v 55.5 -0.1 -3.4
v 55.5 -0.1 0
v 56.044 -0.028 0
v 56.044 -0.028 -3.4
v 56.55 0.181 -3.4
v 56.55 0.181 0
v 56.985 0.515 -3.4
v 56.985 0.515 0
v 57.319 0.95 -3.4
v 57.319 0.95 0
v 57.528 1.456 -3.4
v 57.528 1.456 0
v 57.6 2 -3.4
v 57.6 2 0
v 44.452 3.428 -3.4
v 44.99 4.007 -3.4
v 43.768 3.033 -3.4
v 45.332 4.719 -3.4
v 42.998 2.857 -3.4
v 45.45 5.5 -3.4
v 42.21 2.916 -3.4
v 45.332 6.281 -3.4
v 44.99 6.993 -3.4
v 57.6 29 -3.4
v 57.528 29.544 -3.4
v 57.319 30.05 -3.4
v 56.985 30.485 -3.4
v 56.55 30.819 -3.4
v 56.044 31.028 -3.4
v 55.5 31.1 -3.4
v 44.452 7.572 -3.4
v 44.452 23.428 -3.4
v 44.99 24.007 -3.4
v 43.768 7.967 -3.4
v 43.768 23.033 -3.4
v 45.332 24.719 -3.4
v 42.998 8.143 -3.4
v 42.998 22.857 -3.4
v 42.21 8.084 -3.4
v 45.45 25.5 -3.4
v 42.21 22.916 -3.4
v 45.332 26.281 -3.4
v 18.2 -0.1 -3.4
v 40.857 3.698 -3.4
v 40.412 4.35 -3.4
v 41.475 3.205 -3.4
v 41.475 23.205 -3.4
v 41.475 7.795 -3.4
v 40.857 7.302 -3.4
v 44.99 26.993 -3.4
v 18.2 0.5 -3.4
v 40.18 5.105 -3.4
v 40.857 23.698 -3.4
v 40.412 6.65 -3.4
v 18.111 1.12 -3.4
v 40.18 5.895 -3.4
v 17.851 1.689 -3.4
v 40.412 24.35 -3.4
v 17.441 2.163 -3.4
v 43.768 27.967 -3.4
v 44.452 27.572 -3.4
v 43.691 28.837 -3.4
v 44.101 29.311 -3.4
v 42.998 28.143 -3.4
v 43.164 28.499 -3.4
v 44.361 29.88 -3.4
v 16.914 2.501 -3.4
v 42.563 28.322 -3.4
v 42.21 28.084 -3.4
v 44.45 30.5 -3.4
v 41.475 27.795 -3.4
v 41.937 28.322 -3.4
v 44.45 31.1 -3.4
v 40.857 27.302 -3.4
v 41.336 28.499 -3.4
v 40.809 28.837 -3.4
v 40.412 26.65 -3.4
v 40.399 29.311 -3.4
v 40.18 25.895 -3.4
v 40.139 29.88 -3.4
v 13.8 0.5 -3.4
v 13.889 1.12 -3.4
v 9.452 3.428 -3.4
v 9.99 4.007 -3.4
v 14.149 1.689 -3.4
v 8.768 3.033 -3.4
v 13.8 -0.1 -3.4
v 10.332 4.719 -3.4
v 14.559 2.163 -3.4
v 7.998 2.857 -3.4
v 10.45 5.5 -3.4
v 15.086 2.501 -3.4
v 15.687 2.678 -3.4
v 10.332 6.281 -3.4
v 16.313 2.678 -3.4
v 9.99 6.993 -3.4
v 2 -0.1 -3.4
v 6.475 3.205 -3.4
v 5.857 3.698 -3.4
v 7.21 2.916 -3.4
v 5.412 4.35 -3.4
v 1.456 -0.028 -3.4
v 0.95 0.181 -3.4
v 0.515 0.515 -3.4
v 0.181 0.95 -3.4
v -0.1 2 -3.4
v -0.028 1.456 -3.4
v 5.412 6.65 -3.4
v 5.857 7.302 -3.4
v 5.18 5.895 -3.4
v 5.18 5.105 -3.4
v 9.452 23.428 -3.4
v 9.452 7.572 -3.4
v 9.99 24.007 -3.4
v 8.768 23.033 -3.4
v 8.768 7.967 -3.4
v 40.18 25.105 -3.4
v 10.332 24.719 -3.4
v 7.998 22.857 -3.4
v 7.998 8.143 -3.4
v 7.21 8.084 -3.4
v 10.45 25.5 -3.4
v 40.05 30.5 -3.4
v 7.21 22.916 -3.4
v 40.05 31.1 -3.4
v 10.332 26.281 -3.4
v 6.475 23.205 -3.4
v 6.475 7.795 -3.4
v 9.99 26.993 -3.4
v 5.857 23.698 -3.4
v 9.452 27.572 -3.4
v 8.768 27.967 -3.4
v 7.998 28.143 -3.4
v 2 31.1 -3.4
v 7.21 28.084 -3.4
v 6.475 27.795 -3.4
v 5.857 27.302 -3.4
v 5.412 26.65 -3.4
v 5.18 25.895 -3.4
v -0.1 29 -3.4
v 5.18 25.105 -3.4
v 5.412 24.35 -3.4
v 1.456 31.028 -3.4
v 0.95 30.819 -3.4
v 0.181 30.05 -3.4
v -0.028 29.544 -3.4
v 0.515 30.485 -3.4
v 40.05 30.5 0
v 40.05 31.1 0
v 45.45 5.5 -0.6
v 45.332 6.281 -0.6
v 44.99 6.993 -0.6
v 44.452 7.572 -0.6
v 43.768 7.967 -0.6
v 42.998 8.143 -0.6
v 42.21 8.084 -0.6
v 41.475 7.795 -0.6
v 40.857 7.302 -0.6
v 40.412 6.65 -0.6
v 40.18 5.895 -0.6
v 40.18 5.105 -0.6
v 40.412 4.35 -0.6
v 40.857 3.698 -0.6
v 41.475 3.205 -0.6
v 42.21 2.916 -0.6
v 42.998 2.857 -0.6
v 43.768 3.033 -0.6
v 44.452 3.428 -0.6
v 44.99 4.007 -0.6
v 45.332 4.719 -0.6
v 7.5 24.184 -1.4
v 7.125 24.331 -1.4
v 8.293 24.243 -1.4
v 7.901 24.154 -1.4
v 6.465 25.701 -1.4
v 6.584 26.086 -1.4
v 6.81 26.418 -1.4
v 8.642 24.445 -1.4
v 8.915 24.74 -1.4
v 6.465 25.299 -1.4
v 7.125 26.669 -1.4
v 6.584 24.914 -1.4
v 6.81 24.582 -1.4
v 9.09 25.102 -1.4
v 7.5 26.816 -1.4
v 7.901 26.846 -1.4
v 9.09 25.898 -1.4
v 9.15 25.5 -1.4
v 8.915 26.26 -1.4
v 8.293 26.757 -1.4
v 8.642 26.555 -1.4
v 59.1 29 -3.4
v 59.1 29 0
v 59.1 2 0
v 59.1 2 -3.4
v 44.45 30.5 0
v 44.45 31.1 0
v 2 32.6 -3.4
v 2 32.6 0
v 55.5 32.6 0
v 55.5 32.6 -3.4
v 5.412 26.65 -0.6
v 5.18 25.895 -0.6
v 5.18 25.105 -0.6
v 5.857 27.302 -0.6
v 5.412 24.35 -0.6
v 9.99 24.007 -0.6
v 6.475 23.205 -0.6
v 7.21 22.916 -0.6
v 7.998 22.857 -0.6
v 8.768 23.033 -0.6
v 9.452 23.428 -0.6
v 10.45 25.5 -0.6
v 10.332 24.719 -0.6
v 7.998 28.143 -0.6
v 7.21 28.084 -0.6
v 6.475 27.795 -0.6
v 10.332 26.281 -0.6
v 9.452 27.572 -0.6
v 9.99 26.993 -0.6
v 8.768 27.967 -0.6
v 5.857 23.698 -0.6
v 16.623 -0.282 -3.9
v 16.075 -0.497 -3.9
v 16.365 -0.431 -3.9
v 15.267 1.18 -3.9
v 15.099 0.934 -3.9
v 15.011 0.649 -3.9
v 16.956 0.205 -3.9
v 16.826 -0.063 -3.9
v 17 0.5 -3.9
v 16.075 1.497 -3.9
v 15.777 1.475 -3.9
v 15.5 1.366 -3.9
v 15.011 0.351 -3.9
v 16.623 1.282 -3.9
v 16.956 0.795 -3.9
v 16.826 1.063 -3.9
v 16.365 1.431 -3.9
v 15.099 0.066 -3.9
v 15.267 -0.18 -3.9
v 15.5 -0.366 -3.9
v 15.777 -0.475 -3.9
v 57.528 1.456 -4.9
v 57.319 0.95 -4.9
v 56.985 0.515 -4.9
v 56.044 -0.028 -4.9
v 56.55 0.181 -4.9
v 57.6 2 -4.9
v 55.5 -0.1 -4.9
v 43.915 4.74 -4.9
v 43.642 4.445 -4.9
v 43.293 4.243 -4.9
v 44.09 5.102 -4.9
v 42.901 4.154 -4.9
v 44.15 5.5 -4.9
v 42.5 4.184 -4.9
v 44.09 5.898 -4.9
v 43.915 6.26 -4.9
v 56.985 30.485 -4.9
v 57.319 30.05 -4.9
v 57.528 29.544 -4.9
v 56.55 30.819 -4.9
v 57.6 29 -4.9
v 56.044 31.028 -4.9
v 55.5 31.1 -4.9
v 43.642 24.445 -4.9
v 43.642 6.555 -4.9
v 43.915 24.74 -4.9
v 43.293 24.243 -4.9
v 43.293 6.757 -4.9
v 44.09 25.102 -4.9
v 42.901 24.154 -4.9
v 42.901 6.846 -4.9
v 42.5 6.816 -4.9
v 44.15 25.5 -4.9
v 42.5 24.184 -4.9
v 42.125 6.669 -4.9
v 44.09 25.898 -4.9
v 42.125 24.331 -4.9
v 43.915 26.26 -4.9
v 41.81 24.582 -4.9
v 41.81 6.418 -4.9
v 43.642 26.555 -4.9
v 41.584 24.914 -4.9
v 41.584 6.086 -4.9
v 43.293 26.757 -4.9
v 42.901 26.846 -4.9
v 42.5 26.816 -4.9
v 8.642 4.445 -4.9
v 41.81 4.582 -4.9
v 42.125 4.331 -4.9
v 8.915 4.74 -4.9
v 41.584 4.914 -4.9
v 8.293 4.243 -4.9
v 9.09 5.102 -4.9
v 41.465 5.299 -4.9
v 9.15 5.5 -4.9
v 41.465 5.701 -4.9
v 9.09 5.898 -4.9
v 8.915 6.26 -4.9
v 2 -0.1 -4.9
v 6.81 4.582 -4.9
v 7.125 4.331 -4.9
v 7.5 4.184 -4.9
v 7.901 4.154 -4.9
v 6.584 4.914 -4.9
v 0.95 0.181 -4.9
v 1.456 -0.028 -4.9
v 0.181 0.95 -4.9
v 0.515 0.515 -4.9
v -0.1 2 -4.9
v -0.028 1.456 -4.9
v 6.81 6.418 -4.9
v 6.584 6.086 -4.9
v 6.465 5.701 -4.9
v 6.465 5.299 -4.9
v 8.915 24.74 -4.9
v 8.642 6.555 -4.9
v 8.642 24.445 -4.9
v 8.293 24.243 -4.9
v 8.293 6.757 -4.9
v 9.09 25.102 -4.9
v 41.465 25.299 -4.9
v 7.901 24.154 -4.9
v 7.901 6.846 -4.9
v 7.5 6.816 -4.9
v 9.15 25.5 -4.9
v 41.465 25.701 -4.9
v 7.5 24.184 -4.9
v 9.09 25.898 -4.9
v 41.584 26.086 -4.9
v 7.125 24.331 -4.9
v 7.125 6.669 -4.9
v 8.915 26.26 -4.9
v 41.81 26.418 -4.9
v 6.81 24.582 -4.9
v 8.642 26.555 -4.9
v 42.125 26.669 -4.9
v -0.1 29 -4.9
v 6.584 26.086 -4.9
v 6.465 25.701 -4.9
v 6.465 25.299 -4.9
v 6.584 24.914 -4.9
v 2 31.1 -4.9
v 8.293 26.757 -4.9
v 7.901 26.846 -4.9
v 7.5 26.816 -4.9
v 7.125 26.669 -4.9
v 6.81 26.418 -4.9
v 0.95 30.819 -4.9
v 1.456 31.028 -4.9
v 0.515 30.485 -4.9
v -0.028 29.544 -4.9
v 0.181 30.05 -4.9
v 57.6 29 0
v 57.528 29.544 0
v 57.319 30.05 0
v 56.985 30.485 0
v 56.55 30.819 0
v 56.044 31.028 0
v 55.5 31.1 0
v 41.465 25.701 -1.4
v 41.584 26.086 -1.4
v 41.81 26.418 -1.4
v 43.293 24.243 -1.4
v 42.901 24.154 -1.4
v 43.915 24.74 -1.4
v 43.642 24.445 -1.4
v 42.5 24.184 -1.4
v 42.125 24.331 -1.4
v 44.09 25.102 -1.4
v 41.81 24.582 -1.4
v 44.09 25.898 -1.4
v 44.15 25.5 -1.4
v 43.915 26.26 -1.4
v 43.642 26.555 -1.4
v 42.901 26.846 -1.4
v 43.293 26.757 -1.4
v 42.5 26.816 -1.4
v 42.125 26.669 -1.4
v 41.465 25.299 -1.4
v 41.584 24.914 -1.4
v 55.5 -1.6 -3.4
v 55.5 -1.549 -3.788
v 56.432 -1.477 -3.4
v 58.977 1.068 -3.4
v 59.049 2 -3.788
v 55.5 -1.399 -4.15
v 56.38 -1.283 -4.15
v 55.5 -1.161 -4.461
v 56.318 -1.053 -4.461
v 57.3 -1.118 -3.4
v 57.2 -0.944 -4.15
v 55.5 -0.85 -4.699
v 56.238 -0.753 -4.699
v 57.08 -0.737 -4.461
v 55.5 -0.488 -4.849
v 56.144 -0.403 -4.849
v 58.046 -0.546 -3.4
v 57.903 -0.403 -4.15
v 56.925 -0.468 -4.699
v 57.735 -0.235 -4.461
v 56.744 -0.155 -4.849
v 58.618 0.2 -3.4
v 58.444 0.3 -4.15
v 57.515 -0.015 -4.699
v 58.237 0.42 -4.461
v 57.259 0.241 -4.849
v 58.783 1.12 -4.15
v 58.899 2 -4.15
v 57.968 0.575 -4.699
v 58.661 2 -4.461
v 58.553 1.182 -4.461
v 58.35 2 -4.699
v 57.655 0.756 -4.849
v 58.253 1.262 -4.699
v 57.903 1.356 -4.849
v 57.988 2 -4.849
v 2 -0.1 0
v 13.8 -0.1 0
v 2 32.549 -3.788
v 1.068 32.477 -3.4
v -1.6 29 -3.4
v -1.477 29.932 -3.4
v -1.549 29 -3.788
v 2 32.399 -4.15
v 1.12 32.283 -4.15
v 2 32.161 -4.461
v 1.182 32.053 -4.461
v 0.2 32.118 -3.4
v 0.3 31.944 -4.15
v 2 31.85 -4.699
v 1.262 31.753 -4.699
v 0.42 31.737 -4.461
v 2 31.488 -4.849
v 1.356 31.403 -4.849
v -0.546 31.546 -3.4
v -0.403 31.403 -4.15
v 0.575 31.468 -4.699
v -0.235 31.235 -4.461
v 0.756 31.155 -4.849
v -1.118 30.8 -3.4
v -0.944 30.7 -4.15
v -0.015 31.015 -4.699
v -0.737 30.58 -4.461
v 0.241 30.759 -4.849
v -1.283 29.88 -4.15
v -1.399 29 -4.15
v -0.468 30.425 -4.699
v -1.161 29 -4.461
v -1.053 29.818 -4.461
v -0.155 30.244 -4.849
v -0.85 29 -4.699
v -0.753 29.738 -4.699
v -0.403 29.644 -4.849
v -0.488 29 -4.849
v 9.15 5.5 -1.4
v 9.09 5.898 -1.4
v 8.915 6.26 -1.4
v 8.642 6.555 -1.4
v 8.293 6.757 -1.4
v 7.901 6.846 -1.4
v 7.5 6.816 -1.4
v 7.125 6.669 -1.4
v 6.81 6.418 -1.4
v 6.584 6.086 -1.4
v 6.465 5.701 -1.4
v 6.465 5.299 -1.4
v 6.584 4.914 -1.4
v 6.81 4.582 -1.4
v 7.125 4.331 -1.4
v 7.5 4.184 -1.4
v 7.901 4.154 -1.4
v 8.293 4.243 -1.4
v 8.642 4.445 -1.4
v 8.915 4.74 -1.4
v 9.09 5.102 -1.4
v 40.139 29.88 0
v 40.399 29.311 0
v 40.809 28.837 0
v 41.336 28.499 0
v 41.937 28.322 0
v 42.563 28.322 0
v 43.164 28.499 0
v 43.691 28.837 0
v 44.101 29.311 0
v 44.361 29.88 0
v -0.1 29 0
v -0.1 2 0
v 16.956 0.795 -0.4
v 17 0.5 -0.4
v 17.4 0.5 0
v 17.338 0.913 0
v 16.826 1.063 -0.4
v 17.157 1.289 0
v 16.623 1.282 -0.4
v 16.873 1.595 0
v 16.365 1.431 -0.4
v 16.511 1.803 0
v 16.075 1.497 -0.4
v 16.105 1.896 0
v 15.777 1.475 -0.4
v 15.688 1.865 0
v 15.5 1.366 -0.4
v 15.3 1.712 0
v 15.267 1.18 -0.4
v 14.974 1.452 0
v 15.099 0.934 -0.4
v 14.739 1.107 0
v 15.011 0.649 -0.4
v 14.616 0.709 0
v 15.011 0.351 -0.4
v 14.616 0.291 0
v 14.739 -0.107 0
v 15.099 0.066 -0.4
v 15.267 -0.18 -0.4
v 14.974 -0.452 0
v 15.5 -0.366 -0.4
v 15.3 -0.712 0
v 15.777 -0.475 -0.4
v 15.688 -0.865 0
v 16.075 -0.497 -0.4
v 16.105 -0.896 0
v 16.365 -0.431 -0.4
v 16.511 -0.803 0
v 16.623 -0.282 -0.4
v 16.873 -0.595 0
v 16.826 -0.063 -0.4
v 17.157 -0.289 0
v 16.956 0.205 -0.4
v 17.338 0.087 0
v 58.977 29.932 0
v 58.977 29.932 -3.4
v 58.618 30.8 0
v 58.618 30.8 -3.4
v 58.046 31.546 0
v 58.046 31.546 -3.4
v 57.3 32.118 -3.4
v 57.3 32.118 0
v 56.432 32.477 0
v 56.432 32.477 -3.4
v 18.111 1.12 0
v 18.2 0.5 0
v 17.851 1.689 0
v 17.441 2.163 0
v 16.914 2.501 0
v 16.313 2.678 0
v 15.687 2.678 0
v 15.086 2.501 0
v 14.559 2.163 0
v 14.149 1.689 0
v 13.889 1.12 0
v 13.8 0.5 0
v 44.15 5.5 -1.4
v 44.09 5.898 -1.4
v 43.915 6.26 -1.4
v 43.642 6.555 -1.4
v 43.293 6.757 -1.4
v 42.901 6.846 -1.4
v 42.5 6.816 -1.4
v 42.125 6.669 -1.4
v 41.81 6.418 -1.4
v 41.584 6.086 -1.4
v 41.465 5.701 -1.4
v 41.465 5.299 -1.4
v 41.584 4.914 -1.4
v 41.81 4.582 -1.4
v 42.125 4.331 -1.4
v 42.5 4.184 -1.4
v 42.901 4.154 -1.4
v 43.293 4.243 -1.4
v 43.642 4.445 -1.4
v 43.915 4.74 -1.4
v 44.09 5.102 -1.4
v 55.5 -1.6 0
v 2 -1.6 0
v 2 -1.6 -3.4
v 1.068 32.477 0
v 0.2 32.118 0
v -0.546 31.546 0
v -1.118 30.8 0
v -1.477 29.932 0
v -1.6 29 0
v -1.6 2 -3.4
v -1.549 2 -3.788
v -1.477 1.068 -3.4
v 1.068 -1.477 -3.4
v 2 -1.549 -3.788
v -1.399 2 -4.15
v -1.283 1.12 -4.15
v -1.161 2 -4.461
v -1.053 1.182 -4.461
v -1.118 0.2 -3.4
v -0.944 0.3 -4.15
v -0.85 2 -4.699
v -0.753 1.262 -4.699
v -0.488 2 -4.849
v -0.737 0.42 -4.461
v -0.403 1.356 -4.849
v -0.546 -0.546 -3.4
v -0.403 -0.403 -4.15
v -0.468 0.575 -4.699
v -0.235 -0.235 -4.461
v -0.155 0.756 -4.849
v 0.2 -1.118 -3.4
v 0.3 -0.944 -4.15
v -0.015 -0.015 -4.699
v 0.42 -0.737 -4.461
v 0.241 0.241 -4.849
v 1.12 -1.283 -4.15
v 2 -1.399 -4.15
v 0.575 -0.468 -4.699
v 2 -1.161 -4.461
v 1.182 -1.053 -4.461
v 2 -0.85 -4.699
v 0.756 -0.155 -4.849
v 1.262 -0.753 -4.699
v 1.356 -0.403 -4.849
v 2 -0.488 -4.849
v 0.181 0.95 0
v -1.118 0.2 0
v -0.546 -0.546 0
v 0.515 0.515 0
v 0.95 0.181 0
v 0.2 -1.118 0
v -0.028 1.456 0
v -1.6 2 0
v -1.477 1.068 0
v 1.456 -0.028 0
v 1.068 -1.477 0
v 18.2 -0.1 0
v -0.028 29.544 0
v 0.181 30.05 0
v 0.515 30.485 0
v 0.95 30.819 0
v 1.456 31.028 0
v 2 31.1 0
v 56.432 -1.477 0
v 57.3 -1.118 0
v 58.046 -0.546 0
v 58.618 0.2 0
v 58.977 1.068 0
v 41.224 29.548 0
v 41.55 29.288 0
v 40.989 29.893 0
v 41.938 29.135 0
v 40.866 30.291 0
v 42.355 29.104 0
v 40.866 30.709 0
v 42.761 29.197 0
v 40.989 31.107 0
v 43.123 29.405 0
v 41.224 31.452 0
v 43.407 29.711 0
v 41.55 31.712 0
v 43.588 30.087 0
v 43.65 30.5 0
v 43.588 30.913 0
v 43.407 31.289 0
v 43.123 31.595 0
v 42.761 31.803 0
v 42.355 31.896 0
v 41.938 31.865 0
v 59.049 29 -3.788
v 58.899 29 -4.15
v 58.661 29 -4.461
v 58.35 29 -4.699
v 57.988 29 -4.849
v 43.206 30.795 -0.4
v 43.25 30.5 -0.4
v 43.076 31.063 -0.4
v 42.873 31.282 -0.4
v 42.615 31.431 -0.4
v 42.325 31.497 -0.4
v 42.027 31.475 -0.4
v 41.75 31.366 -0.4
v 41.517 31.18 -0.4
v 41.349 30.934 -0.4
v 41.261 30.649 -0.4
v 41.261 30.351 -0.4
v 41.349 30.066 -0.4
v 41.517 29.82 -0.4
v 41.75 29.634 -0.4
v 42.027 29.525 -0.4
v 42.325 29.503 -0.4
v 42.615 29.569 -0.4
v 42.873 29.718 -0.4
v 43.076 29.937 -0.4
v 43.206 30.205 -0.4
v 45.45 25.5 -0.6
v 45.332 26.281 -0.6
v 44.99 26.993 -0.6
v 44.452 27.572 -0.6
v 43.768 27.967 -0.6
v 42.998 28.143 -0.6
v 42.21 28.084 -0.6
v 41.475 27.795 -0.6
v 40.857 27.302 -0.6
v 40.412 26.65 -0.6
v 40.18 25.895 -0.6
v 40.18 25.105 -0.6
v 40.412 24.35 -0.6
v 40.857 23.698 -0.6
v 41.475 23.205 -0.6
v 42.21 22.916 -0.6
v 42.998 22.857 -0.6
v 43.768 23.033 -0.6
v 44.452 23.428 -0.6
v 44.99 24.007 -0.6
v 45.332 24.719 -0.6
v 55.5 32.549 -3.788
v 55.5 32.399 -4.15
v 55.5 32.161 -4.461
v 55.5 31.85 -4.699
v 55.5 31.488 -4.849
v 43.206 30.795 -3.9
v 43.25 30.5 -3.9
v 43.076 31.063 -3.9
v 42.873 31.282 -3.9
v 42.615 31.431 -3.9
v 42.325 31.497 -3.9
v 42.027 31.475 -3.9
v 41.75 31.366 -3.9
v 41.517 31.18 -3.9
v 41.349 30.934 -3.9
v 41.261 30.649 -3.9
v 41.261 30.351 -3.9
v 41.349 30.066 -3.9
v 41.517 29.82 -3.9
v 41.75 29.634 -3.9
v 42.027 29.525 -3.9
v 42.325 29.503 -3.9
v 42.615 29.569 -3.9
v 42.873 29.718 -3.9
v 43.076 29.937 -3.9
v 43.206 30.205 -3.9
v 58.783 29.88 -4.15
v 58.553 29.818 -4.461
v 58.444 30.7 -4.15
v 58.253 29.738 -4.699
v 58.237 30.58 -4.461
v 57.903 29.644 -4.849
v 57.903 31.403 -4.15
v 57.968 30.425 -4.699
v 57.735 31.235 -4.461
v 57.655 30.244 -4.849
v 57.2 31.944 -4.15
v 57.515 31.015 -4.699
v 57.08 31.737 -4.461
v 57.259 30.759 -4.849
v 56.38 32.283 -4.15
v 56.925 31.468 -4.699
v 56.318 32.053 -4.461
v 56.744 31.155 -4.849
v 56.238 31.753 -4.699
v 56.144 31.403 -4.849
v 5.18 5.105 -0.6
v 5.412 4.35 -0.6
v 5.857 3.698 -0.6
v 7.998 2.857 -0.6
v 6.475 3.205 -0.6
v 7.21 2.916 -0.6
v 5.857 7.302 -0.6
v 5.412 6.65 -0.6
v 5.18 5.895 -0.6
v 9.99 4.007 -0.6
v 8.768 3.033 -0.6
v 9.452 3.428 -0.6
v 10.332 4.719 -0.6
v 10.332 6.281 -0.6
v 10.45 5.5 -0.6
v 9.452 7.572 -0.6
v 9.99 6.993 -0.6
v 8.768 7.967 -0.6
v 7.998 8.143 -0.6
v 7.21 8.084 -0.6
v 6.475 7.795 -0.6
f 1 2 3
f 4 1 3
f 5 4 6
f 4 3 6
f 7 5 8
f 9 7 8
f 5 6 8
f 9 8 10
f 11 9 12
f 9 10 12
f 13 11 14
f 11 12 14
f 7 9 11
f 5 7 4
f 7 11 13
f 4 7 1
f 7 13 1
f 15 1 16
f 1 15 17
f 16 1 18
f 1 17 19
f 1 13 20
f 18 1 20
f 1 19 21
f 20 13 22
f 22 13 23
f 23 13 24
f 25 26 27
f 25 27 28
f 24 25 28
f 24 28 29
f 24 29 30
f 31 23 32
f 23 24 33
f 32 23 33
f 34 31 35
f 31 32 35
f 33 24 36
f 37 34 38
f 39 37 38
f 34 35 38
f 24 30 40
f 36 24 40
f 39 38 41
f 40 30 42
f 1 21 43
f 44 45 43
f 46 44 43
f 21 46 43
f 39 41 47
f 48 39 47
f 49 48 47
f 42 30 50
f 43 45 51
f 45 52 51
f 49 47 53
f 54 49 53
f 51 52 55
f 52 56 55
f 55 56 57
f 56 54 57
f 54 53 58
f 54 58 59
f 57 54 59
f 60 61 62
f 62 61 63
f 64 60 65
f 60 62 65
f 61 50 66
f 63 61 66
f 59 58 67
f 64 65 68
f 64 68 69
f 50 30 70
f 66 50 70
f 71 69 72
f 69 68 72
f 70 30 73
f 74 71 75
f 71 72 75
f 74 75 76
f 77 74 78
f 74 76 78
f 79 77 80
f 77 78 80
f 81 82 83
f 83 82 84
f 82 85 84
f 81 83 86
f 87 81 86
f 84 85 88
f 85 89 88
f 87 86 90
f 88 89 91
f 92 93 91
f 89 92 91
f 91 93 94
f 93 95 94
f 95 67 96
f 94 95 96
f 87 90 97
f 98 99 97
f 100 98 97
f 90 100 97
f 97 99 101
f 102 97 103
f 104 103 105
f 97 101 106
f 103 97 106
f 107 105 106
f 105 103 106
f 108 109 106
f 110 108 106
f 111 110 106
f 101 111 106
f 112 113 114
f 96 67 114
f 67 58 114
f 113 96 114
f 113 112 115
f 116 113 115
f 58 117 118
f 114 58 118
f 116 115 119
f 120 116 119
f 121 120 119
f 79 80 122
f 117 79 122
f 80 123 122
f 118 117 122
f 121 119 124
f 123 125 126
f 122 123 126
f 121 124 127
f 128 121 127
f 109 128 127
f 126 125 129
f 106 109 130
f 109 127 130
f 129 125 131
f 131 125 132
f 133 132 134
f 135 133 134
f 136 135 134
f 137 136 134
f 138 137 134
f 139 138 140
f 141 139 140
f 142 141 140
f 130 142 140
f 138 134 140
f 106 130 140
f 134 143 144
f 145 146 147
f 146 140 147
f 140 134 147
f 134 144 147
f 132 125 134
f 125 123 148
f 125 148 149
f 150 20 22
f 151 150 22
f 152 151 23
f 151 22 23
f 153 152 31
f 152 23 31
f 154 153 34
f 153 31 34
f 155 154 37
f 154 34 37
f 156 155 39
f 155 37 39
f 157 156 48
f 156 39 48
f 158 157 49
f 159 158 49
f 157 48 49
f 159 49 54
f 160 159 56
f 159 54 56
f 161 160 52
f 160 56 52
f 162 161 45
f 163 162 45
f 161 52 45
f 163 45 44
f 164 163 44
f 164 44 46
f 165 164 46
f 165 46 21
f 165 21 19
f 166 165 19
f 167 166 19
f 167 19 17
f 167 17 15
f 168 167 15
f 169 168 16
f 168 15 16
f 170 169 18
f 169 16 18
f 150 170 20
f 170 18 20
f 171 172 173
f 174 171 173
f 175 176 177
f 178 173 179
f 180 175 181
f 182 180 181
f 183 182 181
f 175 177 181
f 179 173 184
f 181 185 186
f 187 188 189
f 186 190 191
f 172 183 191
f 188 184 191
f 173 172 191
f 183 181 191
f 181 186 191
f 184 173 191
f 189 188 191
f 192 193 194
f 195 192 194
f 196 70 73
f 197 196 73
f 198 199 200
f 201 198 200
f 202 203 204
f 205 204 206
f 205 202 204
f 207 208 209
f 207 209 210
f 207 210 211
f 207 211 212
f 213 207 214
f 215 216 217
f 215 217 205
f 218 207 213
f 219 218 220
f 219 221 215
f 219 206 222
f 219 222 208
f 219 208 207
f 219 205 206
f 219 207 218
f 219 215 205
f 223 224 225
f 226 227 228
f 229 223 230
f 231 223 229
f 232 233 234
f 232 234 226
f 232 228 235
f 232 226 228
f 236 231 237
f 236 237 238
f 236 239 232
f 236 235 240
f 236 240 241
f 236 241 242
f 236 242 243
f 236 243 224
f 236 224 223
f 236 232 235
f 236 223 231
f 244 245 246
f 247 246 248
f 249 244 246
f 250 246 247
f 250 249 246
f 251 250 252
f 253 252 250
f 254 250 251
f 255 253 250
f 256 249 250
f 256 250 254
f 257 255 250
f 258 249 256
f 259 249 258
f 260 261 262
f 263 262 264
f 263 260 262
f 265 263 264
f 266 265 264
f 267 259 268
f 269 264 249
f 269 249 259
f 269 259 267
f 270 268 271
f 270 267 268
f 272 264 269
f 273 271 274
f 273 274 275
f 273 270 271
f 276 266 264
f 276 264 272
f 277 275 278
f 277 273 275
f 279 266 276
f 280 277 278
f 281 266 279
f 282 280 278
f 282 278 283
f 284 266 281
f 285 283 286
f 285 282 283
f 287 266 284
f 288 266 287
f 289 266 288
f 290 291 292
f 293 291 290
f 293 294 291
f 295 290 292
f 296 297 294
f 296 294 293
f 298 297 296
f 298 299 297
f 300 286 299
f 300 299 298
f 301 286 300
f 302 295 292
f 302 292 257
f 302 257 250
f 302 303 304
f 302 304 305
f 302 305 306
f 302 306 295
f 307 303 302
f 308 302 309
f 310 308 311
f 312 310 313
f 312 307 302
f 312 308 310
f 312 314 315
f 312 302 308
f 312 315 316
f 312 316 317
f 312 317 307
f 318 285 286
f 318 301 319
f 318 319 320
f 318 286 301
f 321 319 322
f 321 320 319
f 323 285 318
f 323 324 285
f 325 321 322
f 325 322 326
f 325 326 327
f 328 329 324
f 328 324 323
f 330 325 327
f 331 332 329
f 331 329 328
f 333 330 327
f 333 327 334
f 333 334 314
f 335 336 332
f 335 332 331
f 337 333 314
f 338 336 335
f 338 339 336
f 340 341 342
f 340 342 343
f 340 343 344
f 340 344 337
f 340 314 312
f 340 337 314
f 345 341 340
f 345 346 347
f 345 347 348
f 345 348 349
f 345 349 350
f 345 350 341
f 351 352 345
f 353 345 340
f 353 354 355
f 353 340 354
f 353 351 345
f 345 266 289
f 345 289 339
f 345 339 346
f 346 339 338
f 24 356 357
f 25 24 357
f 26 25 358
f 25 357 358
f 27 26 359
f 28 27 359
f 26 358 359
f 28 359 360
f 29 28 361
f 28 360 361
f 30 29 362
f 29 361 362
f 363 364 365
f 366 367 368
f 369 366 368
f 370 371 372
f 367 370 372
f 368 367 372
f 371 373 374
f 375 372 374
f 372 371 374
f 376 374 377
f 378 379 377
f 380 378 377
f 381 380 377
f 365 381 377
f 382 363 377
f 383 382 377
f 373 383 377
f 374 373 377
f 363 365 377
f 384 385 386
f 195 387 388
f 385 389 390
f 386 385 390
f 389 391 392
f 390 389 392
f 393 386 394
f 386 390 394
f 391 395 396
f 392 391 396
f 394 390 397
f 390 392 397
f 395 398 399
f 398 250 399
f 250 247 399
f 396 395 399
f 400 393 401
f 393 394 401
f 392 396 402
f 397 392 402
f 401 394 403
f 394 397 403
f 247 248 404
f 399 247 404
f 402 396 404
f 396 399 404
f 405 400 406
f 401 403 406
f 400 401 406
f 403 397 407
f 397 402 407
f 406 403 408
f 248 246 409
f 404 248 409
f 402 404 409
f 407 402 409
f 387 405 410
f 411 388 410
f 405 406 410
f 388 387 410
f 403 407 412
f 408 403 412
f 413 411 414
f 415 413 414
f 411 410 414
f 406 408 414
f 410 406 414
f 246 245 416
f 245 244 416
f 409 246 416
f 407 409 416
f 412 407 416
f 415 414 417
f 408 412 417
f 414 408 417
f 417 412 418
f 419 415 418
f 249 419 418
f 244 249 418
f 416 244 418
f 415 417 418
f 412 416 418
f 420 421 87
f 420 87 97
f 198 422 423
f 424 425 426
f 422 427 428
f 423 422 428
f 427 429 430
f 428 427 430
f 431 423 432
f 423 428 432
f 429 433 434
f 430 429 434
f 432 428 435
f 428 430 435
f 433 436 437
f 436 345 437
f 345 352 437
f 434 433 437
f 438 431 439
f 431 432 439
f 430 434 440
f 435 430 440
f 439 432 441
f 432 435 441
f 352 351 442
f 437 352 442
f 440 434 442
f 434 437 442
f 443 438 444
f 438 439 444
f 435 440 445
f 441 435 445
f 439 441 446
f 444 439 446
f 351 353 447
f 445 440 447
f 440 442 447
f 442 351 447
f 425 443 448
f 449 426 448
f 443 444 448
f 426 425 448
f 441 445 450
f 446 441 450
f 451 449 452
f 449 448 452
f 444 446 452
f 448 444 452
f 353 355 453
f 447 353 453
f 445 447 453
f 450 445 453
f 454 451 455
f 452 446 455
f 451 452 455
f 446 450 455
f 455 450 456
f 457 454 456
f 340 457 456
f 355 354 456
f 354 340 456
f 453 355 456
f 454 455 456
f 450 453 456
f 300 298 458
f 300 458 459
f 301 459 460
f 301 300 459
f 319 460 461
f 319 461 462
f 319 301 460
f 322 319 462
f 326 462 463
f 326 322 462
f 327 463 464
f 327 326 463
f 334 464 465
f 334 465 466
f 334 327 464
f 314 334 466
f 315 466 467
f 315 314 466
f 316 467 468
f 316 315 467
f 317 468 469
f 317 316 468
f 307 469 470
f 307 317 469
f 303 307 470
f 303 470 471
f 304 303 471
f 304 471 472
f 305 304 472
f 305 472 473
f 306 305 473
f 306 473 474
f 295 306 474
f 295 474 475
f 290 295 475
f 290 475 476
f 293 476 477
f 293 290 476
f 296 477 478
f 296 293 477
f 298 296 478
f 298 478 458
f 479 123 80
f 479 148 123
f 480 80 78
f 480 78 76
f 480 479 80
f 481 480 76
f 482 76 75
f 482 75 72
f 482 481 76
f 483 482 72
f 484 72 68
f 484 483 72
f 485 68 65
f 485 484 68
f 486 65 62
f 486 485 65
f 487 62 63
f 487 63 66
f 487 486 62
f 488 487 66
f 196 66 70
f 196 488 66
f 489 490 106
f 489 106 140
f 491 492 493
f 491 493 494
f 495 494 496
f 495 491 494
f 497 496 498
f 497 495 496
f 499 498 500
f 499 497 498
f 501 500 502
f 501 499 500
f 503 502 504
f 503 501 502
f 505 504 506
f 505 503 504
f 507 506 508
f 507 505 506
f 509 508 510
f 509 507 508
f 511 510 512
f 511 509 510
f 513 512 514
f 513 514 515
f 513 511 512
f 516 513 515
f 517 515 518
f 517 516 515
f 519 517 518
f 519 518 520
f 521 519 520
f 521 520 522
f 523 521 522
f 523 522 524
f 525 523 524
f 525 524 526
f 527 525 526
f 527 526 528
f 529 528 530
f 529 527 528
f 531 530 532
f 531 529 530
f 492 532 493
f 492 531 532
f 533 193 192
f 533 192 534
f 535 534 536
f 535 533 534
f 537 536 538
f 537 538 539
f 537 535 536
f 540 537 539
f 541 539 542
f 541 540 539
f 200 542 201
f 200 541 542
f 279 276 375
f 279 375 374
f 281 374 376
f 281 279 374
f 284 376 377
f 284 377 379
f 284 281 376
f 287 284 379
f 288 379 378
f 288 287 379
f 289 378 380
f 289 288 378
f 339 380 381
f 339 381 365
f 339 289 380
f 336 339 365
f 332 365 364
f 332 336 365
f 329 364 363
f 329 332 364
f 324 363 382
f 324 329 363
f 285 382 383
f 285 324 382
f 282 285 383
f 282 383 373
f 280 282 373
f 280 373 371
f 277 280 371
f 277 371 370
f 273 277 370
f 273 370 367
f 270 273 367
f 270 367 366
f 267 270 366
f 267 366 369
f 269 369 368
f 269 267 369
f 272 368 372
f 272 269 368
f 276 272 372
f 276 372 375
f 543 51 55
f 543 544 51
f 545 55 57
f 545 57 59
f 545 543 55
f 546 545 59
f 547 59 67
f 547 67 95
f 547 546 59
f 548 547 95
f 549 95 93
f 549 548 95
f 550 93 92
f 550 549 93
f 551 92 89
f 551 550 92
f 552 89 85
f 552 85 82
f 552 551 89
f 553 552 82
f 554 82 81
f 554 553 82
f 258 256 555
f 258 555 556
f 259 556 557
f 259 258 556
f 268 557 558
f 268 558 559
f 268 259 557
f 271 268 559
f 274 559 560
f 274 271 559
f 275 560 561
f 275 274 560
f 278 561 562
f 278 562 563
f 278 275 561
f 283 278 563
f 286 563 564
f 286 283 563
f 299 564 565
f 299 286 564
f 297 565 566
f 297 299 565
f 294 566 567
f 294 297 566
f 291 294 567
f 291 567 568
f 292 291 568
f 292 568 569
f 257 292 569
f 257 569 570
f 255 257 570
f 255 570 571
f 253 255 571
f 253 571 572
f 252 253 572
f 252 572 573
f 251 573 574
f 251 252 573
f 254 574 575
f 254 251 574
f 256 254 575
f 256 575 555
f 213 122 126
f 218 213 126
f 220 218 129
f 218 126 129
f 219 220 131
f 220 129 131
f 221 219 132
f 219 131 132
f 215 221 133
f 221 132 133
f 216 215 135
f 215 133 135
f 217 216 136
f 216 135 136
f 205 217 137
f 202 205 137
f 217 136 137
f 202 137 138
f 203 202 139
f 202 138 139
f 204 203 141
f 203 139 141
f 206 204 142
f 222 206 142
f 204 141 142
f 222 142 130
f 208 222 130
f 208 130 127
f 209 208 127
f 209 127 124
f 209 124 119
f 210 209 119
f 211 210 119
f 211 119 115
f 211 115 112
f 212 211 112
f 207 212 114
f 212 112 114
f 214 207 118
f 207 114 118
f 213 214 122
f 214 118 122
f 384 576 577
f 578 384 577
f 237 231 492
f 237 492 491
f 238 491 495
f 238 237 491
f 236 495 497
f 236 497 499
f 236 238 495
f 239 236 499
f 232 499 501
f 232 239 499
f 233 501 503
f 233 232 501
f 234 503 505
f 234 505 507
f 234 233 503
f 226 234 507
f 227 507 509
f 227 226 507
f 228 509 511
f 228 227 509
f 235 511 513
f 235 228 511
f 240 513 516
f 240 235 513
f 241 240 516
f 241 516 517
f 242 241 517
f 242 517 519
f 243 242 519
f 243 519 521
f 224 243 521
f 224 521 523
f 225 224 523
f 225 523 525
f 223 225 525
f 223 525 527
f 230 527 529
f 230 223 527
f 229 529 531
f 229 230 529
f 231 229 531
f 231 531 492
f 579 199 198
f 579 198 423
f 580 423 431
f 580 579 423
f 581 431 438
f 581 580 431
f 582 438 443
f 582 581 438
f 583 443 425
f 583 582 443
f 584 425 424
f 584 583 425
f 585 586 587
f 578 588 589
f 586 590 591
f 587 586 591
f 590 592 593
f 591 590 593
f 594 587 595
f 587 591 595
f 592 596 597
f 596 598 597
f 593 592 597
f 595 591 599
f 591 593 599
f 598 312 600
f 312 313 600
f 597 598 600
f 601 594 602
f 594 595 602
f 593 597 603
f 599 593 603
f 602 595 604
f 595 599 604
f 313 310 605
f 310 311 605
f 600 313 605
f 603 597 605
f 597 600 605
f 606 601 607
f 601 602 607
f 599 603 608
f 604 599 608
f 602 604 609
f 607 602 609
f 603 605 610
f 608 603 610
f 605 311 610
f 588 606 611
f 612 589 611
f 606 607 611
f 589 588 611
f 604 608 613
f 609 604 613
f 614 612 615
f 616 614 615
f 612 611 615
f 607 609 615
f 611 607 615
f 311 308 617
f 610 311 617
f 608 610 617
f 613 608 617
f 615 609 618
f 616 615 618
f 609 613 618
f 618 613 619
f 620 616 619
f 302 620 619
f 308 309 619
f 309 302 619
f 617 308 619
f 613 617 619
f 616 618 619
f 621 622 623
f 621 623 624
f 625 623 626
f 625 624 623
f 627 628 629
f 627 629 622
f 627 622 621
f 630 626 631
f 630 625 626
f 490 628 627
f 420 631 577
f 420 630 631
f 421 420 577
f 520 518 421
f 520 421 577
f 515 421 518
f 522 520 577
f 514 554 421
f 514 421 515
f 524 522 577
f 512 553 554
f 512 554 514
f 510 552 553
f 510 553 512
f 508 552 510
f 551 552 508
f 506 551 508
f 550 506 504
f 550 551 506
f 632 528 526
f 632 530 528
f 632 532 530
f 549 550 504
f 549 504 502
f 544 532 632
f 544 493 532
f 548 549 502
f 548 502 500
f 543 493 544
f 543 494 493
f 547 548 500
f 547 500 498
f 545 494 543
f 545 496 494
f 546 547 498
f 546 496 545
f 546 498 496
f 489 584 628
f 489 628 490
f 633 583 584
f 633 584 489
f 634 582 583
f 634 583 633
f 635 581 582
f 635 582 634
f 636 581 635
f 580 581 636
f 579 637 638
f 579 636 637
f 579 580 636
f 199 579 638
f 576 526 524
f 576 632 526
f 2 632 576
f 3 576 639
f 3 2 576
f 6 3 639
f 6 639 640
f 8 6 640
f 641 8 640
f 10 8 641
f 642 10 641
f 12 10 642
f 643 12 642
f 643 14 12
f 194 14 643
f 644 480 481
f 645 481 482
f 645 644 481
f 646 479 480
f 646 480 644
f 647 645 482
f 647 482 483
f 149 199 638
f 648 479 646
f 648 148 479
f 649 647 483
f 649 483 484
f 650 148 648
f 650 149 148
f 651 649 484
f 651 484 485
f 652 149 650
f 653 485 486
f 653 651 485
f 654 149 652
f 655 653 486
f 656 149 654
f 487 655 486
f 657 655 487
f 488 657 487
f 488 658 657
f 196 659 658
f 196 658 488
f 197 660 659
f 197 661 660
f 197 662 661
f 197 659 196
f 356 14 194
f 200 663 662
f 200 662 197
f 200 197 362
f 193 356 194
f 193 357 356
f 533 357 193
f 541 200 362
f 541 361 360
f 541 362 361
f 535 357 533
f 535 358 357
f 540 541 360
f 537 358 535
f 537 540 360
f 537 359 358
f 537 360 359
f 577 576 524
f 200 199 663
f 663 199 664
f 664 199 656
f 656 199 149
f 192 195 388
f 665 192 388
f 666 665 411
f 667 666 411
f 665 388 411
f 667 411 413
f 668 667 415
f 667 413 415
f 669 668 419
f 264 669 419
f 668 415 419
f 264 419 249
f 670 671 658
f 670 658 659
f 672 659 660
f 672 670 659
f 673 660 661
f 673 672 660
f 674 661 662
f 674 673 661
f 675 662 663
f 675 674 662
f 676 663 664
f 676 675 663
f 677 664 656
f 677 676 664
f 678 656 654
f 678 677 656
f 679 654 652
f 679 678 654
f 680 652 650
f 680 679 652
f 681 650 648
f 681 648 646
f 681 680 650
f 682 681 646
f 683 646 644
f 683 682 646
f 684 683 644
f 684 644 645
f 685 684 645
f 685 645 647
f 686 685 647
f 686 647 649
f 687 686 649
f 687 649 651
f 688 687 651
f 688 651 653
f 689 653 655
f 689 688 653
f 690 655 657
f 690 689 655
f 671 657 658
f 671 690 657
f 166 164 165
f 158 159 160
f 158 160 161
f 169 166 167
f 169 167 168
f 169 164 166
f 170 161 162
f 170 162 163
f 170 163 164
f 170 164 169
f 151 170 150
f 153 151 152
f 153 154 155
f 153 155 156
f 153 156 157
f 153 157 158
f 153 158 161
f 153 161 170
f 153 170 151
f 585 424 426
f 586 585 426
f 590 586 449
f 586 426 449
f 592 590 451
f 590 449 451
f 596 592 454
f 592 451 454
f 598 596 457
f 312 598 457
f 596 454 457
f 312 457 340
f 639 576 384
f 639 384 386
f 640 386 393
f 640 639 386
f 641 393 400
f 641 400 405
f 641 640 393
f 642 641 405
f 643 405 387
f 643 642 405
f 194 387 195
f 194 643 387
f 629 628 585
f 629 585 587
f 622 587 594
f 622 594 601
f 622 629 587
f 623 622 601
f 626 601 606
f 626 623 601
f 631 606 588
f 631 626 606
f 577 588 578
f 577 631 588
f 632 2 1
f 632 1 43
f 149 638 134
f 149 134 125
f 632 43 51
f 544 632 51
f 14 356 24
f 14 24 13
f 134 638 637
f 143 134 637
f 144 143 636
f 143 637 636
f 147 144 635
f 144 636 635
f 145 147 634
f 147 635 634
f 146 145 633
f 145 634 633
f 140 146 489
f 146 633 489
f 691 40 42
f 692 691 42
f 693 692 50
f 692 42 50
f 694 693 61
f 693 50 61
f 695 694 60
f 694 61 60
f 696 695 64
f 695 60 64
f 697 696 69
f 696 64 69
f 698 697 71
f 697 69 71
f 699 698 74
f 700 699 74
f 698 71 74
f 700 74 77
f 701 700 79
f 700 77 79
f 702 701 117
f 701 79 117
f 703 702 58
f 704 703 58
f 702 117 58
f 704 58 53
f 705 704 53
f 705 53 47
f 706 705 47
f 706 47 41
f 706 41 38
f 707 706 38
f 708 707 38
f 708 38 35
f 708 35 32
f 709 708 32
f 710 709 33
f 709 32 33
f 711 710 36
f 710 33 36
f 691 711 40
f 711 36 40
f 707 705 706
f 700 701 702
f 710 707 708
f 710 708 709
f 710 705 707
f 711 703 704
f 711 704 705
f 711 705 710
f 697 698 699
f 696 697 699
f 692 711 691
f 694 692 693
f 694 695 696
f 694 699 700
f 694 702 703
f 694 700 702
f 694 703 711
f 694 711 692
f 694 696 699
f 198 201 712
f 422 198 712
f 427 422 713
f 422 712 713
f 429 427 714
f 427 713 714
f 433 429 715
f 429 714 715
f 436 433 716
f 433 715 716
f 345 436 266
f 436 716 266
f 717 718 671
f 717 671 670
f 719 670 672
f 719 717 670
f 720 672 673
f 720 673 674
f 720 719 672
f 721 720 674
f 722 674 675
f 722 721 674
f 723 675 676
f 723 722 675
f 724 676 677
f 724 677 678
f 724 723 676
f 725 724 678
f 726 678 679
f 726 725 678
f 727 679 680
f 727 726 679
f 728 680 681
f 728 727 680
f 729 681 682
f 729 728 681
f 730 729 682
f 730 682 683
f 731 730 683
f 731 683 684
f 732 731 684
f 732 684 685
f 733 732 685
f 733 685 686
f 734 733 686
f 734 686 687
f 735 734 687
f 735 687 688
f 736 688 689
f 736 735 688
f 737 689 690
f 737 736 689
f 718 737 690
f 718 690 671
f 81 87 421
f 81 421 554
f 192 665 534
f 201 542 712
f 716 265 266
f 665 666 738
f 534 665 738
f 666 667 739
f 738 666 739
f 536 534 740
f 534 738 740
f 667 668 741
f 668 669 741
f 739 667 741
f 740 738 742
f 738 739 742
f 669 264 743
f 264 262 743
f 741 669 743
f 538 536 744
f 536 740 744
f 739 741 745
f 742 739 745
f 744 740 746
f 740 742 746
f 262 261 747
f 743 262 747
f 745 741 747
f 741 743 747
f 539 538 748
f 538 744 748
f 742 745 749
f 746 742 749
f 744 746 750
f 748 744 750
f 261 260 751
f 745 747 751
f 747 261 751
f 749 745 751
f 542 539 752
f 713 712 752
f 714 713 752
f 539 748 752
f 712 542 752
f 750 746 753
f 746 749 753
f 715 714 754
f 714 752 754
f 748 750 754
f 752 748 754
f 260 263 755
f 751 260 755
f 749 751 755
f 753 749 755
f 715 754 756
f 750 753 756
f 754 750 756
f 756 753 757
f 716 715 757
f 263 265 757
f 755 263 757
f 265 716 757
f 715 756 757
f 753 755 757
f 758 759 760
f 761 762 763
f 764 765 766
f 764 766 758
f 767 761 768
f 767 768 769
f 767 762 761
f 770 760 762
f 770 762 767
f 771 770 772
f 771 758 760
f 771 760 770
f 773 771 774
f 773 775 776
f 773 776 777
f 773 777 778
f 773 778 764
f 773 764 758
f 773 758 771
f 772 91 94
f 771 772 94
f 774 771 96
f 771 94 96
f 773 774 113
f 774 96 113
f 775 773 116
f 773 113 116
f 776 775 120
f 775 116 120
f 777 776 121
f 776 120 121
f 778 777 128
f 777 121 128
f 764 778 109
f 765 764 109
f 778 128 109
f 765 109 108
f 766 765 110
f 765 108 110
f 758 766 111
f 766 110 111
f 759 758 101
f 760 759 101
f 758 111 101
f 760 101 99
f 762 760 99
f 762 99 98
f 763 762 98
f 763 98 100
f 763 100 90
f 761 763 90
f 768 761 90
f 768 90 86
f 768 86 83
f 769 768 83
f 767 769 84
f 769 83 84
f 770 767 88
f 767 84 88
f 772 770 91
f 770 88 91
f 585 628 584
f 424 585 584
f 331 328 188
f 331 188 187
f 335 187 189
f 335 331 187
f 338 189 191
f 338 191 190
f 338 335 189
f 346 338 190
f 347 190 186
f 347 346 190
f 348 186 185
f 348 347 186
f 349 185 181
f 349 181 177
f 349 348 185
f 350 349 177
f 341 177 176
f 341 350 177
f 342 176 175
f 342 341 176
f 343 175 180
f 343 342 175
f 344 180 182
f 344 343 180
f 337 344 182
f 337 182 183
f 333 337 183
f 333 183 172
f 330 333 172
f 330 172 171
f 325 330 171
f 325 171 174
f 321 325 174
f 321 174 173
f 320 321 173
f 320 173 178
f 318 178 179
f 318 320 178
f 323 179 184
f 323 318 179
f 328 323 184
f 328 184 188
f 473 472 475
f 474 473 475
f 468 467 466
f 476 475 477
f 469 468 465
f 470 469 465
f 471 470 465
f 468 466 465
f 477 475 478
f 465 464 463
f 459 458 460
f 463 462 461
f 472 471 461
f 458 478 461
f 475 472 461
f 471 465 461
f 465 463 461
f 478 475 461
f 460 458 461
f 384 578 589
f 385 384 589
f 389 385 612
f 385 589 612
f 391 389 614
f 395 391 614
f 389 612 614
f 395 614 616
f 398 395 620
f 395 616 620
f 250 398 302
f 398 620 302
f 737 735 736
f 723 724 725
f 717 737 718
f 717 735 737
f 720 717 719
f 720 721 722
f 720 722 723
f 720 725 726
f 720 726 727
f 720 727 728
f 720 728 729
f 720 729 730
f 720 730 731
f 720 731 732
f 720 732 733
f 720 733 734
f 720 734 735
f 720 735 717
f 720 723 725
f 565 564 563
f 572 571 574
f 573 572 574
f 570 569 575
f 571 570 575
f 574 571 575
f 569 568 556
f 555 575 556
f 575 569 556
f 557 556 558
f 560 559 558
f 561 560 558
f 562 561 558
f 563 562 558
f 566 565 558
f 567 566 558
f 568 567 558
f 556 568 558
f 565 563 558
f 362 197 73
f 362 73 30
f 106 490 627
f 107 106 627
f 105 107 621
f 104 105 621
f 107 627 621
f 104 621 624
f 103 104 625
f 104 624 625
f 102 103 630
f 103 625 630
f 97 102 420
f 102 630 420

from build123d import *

# Parameters (mm, degrees)
PAD_DEPTH         = 3.4
THICKNESS_T       = 1.5
CYLINDER_W        = 2.2
CYLINDER_H        = 3.4
CYLINDER_ANGLE    = 180
BOX004_W          = 4.4
BOX004_H          = 0.6
BOX004_DEPTH      = 3.4
CYLINDER002_R     = 1
CYLINDER002_DEPTH = 3.9
CHAMFER_SIZE      = 0.4
CYLINDER003_W     = 2.2
CYLINDER003_H     = 3.4
CYLINDER003_ANGLE = 180
BOX006_W          = 4.4
BOX006_H          = 0.6
BOX006_DEPTH      = 3.4
CYLINDER004_R     = 1
CYLINDER004_DEPTH = 3.9
CHAMFER001_SIZE   = 0.4
SKETCH004_R       = 2.65
PAD002_DEPTH      = 2.8
SKETCH005_R       = 1.35
POCKET001_DEPTH   = 3.5


with BuildPart() as part:
    # Sketch → Pad (new body)
    with BuildSketch(Plane.XY):
        with BuildLine():
            Line((2, 31.1), (55.5, 31.1))
            ThreePointArc((57.6, 29), (56.984924, 30.484924), (55.5, 31.1))
            Line((57.6, 29), (57.6, 2))
            ThreePointArc((55.5, -0.1), (56.984924, 0.515076), (57.6, 2))
            Line((55.5, -0.1), (2, -0.1))
            ThreePointArc((-0.1, 2), (0.515076, 0.515076), (2, -0.1))
            Line((-0.1, 2), (-0.1, 29))
            ThreePointArc((2, 31.1), (0.515076, 30.484924), (-0.1, 29))
        make_face()
    extrude(amount=-PAD_DEPTH)

    # Thickness
    thickness_openings = [part.faces().sort_by_distance(p)[0] for p in [
        (28.75, 15.5, 0),
    ]]
    offset(amount=THICKNESS_T, openings=thickness_openings)

    # Cylinder → Cylinder (revolve)
    with BuildSketch(Plane(origin=(16, 0.5, -3.4), x_dir=(1, 0, 0), z_dir=(0, -1, 0))):
        with Locations((1.1, 1.7)):
            Rectangle(CYLINDER_W, CYLINDER_H)
    revolve(axis=Axis((16, 0.5, -3.4), (0, 0, 1)), revolution_arc=CYLINDER_ANGLE)

    # Box004 → Box004 (join)
    with BuildSketch(Plane(origin=(13.8, -0.1, -3.4), x_dir=(1, 0, 0), z_dir=(0, 0, 1))):
        with Locations((2.2, 0.3)):
            Rectangle(BOX004_W, BOX004_H)
    extrude(amount=BOX004_DEPTH)

    # Cylinder002 → Cylinder002 (cut)
    with BuildSketch(Plane(origin=(16, 0.5, -3.9), x_dir=(1, 0, 0), z_dir=(0, 0, 1))):
        Circle(CYLINDER002_R)
    extrude(amount=CYLINDER002_DEPTH, mode=Mode.SUBTRACT)

    # Chamfer
    chamfer_edges = [part.edges().sort_by_distance(p)[0] for p in [
        (16, 1.5, 0),
        (16, -0.5, 0),
        (15.051317, 0.183772, 0),
        (16.948683, 0.183772, 0),
    ]]
    chamfer(chamfer_edges, length=CHAMFER_SIZE)

    # Cylinder003 → Cylinder003 (revolve)
    with BuildSketch(Plane(origin=(42.25, 30.5, -3.4), x_dir=(-1, 0, 0), z_dir=(0, 1, 0))):
        with Locations((1.1, 1.7)):
            Rectangle(CYLINDER003_W, CYLINDER003_H)
    revolve(axis=Axis((42.25, 30.5, -3.4), (0, 0, 1)), revolution_arc=CYLINDER003_ANGLE)

    # Box006 → Box006 (join)
    with BuildSketch(Plane(origin=(40.05, 30.5, -3.4), x_dir=(1, 0, 0), z_dir=(0, 0, 1))):
        with Locations((2.2, 0.3)):
            Rectangle(BOX006_W, BOX006_H)
    extrude(amount=BOX006_DEPTH)

    # Cylinder004 → Cylinder004 (cut)
    with BuildSketch(Plane(origin=(42.25, 30.5, -3.9), x_dir=(1, 0, 0), z_dir=(0, 0, 1))):
        Circle(CYLINDER004_R)
    extrude(amount=CYLINDER004_DEPTH, mode=Mode.SUBTRACT)

    # Chamfer001
    chamfer001_edges = [part.edges().sort_by_distance(p)[0] for p in [
        (42.25, 31.5, 0),
        (43.198683, 30.816228, 0),
        (42.25, 29.5, 0),
        (41.301317, 30.816228, 0),
    ]]
    chamfer(chamfer001_edges, length=CHAMFER001_SIZE)

    # Sketch004 → Pad002 (join)
    with BuildSketch(Plane.XY.offset(-3.4)):
        with Locations((7.8, 5.5)):
            Circle(SKETCH004_R)
        with Locations((42.8, 5.5)):
            Circle(SKETCH004_R)
        with Locations((7.8, 25.5)):
            Circle(SKETCH004_R)
        with Locations((42.8, 25.5)):
            Circle(SKETCH004_R)
    extrude(amount=PAD002_DEPTH)

    # Sketch005 → Pocket001 (cut)
    with BuildSketch(Plane.XY.offset(-4.9)):
        with Locations((7.8, 5.5)):
            Circle(SKETCH005_R)
        with Locations((42.8, 5.5)):
            Circle(SKETCH005_R)
        with Locations((7.8, 25.5)):
            Circle(SKETCH005_R)
        with Locations((42.8, 25.5)):
            Circle(SKETCH005_R)
    extrude(amount=POCKET001_DEPTH, mode=Mode.SUBTRACT)


solid = part.part
